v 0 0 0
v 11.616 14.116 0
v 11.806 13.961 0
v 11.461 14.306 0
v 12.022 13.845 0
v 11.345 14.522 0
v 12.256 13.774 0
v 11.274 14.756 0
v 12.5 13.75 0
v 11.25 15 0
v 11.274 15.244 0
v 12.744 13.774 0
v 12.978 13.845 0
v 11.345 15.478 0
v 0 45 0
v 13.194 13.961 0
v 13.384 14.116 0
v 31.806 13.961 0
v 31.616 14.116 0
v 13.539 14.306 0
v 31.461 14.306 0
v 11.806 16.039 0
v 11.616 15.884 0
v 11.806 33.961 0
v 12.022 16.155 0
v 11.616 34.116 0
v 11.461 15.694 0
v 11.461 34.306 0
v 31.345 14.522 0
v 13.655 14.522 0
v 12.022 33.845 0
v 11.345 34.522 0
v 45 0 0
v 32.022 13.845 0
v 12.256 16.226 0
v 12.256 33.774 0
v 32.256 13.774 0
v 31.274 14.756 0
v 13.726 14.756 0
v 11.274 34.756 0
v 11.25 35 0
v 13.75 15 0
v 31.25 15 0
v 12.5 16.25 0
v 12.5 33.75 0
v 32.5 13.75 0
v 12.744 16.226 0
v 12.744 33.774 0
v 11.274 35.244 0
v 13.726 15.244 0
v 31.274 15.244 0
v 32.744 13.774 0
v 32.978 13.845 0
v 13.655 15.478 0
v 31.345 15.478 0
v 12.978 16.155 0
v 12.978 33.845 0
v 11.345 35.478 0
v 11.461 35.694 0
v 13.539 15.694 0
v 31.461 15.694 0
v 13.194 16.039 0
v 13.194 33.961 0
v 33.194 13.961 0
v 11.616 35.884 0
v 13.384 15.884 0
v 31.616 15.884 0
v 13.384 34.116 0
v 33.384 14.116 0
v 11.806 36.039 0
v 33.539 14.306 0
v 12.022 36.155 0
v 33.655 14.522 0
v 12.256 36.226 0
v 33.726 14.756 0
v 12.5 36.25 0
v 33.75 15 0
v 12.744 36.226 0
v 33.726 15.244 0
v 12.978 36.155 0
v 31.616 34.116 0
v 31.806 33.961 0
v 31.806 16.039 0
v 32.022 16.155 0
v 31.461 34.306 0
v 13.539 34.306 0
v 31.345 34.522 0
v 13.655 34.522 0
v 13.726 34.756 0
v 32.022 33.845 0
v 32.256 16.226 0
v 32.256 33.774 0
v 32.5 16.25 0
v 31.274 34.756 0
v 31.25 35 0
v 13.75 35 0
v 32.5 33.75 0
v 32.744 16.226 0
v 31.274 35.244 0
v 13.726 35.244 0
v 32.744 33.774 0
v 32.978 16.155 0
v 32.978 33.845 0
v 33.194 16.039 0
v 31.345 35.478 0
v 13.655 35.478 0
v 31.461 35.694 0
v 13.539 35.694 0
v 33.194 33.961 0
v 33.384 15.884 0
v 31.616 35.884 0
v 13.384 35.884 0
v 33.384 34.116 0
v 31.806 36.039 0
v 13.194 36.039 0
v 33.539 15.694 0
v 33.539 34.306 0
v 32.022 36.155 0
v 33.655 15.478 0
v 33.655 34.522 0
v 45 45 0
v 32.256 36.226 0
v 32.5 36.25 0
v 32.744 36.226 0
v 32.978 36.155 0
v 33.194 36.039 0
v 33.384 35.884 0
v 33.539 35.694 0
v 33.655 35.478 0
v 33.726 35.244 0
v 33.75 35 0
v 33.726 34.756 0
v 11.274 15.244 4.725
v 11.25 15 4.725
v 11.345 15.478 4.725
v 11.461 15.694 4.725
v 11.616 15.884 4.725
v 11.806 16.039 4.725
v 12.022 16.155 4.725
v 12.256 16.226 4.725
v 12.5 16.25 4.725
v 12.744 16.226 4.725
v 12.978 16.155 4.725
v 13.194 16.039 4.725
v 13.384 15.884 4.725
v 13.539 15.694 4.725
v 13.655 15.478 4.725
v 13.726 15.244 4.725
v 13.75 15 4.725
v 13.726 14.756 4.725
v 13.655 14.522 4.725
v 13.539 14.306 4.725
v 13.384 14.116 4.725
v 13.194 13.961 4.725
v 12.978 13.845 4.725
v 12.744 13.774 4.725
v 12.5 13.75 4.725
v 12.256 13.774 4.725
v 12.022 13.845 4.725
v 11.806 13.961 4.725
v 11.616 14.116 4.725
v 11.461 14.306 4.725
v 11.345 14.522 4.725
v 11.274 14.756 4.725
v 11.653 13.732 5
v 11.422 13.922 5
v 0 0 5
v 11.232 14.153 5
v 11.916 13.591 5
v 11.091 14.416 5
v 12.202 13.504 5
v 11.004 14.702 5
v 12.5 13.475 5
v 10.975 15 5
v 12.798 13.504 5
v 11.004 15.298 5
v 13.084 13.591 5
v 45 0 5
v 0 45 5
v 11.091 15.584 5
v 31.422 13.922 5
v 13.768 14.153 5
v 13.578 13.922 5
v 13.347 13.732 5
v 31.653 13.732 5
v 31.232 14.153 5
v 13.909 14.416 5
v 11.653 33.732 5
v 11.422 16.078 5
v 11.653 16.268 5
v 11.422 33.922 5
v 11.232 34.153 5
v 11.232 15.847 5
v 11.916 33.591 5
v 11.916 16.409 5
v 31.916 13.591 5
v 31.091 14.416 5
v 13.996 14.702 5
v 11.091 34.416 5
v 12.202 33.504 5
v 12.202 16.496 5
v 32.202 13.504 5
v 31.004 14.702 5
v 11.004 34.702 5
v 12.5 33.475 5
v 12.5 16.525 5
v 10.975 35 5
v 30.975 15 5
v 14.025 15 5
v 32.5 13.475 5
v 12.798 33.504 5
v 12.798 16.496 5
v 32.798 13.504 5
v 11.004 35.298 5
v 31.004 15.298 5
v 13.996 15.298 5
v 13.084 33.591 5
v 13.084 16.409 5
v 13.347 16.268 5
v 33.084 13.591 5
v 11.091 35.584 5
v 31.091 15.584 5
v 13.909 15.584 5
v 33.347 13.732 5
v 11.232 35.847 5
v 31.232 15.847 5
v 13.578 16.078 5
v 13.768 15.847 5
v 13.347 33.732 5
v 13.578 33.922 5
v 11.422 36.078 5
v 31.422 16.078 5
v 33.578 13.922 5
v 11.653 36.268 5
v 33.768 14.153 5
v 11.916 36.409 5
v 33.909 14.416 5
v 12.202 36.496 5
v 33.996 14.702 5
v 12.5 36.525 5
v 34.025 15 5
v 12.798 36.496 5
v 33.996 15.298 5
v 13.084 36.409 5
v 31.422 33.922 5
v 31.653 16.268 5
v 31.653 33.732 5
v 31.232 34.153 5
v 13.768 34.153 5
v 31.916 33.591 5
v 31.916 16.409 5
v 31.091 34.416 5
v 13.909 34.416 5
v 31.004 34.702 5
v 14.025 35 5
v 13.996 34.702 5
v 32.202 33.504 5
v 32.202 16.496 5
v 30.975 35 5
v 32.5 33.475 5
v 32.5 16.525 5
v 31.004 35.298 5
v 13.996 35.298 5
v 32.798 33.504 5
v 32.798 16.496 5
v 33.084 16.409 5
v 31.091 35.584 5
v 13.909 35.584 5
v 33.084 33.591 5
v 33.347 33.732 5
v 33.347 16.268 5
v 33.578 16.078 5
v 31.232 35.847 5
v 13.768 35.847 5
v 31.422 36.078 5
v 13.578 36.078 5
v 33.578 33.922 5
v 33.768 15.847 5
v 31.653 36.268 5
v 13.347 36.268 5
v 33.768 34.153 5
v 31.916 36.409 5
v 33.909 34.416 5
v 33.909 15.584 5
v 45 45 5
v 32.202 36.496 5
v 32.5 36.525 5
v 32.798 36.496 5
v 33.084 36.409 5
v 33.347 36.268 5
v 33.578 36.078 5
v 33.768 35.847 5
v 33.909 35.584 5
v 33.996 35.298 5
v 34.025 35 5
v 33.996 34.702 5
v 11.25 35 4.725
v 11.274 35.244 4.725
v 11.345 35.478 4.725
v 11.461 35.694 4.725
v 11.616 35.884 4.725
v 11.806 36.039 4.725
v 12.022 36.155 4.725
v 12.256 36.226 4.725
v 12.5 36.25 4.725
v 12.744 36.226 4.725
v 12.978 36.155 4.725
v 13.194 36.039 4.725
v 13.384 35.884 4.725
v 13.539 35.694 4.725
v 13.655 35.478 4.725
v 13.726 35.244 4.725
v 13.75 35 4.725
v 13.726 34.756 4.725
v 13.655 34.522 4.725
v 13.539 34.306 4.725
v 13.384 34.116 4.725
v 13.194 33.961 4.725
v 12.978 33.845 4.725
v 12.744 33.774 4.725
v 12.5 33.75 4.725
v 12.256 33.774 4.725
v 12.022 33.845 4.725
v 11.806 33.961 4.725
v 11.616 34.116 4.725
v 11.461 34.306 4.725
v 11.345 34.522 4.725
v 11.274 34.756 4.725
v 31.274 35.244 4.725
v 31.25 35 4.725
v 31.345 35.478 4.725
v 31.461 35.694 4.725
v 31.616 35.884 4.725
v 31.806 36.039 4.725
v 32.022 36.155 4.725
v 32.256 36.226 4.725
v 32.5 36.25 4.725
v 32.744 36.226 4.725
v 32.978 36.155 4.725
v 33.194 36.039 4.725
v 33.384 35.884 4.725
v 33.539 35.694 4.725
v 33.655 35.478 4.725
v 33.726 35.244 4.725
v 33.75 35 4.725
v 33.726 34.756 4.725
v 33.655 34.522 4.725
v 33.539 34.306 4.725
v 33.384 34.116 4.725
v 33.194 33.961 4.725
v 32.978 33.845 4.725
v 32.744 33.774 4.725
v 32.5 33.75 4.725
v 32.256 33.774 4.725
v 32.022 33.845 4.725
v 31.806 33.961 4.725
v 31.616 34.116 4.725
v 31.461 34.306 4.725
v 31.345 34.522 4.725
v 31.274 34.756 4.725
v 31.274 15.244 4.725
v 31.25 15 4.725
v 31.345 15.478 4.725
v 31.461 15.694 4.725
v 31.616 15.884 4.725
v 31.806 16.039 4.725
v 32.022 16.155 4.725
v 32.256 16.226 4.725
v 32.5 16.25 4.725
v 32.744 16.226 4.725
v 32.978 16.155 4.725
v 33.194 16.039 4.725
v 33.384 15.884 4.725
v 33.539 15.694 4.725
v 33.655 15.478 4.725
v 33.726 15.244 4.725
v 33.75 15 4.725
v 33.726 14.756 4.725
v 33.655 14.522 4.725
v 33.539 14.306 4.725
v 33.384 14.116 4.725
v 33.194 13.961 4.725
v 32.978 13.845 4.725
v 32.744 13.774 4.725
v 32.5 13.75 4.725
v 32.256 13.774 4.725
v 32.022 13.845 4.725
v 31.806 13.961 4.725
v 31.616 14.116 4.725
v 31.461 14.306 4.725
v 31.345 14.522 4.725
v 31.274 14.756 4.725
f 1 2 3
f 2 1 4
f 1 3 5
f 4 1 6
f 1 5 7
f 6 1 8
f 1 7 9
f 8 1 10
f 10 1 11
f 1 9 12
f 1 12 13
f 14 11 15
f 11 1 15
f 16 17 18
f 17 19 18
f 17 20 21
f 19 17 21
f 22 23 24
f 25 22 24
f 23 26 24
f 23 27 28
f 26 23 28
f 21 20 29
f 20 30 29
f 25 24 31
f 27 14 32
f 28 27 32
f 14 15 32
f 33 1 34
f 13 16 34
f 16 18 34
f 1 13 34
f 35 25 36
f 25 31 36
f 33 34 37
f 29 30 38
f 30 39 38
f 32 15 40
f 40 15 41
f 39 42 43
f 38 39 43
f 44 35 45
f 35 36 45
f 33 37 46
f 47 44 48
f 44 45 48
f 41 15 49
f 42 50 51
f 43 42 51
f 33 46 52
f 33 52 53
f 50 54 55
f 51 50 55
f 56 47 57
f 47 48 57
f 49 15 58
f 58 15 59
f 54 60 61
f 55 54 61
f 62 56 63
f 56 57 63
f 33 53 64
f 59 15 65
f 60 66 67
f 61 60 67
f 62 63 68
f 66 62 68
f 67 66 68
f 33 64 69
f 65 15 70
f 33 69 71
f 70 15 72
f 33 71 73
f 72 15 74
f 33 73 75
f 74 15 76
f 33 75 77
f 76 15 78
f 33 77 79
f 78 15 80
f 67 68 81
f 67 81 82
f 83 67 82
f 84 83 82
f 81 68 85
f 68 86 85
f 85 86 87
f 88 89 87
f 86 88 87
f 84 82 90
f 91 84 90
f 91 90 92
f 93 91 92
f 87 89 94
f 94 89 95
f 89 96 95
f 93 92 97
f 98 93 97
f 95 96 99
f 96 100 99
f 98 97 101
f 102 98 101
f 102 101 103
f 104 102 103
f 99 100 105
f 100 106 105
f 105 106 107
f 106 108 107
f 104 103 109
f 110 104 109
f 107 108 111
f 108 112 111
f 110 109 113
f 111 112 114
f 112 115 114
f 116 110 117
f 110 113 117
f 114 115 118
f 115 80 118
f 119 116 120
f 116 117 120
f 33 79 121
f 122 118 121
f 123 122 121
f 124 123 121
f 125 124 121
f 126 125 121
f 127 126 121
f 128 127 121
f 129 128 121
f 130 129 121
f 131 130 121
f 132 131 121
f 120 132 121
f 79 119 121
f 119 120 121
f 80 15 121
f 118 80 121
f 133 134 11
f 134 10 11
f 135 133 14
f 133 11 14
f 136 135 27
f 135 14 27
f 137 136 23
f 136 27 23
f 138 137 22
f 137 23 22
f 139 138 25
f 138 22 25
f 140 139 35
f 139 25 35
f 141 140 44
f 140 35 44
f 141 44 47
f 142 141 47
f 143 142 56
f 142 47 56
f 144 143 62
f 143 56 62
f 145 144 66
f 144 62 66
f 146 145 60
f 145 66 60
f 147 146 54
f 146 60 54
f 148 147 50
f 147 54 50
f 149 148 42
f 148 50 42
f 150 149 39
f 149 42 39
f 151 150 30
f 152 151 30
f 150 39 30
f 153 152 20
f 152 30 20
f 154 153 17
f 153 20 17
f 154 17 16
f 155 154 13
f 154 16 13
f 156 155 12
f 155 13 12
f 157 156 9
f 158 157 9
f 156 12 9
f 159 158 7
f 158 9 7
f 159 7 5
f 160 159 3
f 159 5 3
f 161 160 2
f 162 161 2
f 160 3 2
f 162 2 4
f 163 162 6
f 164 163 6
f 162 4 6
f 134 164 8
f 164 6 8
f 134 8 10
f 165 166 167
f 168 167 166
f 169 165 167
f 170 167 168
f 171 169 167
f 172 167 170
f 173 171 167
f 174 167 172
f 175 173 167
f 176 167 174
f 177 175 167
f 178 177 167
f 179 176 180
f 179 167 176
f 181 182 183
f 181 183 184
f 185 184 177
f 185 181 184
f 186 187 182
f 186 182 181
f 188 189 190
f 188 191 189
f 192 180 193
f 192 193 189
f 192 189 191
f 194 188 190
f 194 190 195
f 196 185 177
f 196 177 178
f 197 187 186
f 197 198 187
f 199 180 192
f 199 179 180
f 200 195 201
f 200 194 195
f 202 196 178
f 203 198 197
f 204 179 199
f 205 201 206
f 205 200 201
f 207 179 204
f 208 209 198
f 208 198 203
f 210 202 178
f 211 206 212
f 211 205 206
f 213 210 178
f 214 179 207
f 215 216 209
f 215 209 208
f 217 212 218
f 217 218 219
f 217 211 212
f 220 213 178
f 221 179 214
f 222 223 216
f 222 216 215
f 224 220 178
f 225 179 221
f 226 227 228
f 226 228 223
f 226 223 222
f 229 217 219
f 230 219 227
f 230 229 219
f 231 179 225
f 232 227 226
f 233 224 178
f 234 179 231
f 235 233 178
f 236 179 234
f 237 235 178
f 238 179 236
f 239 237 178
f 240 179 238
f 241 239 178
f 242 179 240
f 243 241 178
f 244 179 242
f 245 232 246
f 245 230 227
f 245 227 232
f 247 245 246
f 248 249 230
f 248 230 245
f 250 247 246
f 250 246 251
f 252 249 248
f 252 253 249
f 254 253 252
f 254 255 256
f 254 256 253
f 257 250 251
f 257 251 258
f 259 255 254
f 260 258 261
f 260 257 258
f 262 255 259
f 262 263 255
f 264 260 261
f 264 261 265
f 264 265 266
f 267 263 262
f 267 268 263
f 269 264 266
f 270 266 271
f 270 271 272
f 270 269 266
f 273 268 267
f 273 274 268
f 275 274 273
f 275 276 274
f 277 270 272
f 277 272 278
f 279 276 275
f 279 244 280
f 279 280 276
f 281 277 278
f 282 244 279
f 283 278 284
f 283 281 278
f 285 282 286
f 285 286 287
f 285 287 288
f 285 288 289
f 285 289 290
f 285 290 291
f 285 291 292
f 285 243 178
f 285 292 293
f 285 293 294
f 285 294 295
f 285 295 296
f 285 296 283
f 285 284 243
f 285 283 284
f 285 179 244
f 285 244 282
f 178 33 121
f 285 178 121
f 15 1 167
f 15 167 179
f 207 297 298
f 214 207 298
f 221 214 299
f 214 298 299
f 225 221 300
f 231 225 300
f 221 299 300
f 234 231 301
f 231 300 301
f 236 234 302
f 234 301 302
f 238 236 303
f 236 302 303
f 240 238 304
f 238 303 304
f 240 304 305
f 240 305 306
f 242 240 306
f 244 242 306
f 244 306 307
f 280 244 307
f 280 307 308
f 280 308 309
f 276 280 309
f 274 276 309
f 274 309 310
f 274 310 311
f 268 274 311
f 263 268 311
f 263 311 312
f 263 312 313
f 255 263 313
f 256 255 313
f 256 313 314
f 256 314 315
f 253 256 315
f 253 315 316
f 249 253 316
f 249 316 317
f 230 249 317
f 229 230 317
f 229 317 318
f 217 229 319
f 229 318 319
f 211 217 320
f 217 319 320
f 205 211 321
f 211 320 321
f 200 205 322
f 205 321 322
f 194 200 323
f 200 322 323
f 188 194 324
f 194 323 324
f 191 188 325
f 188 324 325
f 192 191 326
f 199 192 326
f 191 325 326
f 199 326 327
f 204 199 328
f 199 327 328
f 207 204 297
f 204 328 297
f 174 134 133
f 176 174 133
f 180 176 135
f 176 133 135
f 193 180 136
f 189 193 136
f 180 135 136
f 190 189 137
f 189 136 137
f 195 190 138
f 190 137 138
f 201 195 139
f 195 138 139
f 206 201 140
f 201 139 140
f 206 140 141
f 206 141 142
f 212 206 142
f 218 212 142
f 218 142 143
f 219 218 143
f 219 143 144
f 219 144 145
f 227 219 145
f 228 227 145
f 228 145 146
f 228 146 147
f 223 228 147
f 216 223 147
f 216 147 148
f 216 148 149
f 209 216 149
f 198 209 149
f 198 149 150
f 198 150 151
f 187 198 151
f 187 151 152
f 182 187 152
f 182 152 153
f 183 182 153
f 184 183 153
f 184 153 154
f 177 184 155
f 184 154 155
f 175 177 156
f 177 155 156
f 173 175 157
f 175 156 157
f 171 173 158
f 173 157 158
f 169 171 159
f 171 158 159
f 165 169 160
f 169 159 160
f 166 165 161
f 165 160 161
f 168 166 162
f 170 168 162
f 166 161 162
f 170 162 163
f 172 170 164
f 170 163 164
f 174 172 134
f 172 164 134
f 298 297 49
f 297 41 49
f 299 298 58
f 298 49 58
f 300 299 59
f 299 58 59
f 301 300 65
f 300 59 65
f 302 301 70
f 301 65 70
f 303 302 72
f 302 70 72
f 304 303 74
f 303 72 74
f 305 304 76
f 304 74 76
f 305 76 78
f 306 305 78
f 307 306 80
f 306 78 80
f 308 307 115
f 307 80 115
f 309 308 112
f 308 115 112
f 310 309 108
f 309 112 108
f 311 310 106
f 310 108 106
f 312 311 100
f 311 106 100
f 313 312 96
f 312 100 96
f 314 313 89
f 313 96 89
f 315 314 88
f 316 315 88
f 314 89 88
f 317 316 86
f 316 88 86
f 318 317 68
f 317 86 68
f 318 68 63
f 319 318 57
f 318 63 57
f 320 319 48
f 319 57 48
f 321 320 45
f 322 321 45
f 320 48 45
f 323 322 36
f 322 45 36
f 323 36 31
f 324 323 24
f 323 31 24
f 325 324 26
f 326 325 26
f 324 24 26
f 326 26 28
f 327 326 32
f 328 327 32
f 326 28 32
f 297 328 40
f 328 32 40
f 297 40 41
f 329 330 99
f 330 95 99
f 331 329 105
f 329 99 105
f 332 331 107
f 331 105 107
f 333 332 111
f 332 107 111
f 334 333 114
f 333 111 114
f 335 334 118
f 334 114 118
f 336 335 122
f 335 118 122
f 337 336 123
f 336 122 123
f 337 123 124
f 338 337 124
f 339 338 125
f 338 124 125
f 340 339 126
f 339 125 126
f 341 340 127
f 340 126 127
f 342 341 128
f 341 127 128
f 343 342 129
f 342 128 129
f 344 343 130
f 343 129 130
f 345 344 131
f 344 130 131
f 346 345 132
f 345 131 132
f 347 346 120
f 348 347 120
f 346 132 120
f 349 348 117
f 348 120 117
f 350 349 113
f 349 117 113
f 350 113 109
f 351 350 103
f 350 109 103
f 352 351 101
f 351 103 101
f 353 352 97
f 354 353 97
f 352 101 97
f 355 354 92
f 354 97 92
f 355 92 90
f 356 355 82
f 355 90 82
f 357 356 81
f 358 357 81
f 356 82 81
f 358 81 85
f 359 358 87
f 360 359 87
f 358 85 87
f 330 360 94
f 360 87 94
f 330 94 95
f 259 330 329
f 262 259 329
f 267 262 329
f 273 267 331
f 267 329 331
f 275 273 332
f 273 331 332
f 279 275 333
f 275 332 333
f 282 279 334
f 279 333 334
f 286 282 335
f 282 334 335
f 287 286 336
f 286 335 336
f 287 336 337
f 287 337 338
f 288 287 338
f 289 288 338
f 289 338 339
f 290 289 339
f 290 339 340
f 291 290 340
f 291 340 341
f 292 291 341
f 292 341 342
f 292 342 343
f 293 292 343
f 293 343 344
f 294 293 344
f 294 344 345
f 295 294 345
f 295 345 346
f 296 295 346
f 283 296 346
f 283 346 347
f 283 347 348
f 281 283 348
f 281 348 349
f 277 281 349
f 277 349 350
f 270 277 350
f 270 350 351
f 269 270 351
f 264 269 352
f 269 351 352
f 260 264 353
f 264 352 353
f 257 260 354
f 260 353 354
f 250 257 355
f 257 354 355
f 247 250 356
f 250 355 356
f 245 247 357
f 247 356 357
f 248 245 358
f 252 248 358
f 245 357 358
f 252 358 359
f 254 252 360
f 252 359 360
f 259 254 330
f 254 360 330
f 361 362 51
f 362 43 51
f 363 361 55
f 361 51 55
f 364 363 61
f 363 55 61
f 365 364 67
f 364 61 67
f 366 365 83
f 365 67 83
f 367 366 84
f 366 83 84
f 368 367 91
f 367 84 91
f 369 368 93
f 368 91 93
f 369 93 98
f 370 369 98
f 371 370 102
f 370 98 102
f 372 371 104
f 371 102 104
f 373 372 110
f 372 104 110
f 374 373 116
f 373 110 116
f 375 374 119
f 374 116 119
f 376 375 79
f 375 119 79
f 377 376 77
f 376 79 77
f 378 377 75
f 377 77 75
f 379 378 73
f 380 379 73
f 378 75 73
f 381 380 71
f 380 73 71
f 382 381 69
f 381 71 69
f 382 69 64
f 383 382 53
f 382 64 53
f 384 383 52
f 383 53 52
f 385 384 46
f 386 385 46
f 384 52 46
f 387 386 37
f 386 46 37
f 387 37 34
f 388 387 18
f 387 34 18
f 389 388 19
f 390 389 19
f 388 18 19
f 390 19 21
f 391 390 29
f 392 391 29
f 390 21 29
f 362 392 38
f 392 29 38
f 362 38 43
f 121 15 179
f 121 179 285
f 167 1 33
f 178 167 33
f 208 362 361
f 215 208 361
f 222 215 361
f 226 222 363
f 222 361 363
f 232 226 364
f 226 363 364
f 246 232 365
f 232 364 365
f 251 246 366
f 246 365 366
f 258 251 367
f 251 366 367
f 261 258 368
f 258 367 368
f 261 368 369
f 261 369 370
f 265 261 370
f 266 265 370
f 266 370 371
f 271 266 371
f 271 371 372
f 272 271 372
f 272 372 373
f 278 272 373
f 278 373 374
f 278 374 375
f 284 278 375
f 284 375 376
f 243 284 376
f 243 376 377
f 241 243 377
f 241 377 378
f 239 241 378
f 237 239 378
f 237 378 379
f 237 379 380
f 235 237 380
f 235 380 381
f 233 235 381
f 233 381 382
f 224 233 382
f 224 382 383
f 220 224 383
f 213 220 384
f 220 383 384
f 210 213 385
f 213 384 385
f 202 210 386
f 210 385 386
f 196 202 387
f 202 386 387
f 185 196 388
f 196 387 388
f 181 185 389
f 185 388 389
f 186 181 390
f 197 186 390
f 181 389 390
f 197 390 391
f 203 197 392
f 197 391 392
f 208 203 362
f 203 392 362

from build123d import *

# Parameters (mm, degrees)
SKETCH_1_W                   = 45
SKETCH_1_H                   = 45
EXTRUDE_1_DEPTH              = 5
HOLE_WIZARD_M3_3_D           = 2.5
HOLE_WIZARD_M3_3_CSINK_D     = 3.05
HOLE_WIZARD_M3_3_CSINK_ANGLE = 90


with BuildPart() as part:
    # 草图1 → 凸台-拉伸1 (new body)
    with BuildSketch(Plane.XY):
        with Locations((22.5, 22.5)):
            Rectangle(SKETCH_1_W, SKETCH_1_H)
    extrude(amount=EXTRUDE_1_DEPTH)

    # M3 螺纹孔3 (through all)
    with Locations(Plane.XY.offset(5)):
        with Locations((12.5, 35), (32.5, 35), (32.5, 15), (12.5, 15)):
            CounterSinkHole(HOLE_WIZARD_M3_3_D / 2, HOLE_WIZARD_M3_3_CSINK_D / 2, counter_sink_angle=HOLE_WIZARD_M3_3_CSINK_ANGLE)


solid = part.part
